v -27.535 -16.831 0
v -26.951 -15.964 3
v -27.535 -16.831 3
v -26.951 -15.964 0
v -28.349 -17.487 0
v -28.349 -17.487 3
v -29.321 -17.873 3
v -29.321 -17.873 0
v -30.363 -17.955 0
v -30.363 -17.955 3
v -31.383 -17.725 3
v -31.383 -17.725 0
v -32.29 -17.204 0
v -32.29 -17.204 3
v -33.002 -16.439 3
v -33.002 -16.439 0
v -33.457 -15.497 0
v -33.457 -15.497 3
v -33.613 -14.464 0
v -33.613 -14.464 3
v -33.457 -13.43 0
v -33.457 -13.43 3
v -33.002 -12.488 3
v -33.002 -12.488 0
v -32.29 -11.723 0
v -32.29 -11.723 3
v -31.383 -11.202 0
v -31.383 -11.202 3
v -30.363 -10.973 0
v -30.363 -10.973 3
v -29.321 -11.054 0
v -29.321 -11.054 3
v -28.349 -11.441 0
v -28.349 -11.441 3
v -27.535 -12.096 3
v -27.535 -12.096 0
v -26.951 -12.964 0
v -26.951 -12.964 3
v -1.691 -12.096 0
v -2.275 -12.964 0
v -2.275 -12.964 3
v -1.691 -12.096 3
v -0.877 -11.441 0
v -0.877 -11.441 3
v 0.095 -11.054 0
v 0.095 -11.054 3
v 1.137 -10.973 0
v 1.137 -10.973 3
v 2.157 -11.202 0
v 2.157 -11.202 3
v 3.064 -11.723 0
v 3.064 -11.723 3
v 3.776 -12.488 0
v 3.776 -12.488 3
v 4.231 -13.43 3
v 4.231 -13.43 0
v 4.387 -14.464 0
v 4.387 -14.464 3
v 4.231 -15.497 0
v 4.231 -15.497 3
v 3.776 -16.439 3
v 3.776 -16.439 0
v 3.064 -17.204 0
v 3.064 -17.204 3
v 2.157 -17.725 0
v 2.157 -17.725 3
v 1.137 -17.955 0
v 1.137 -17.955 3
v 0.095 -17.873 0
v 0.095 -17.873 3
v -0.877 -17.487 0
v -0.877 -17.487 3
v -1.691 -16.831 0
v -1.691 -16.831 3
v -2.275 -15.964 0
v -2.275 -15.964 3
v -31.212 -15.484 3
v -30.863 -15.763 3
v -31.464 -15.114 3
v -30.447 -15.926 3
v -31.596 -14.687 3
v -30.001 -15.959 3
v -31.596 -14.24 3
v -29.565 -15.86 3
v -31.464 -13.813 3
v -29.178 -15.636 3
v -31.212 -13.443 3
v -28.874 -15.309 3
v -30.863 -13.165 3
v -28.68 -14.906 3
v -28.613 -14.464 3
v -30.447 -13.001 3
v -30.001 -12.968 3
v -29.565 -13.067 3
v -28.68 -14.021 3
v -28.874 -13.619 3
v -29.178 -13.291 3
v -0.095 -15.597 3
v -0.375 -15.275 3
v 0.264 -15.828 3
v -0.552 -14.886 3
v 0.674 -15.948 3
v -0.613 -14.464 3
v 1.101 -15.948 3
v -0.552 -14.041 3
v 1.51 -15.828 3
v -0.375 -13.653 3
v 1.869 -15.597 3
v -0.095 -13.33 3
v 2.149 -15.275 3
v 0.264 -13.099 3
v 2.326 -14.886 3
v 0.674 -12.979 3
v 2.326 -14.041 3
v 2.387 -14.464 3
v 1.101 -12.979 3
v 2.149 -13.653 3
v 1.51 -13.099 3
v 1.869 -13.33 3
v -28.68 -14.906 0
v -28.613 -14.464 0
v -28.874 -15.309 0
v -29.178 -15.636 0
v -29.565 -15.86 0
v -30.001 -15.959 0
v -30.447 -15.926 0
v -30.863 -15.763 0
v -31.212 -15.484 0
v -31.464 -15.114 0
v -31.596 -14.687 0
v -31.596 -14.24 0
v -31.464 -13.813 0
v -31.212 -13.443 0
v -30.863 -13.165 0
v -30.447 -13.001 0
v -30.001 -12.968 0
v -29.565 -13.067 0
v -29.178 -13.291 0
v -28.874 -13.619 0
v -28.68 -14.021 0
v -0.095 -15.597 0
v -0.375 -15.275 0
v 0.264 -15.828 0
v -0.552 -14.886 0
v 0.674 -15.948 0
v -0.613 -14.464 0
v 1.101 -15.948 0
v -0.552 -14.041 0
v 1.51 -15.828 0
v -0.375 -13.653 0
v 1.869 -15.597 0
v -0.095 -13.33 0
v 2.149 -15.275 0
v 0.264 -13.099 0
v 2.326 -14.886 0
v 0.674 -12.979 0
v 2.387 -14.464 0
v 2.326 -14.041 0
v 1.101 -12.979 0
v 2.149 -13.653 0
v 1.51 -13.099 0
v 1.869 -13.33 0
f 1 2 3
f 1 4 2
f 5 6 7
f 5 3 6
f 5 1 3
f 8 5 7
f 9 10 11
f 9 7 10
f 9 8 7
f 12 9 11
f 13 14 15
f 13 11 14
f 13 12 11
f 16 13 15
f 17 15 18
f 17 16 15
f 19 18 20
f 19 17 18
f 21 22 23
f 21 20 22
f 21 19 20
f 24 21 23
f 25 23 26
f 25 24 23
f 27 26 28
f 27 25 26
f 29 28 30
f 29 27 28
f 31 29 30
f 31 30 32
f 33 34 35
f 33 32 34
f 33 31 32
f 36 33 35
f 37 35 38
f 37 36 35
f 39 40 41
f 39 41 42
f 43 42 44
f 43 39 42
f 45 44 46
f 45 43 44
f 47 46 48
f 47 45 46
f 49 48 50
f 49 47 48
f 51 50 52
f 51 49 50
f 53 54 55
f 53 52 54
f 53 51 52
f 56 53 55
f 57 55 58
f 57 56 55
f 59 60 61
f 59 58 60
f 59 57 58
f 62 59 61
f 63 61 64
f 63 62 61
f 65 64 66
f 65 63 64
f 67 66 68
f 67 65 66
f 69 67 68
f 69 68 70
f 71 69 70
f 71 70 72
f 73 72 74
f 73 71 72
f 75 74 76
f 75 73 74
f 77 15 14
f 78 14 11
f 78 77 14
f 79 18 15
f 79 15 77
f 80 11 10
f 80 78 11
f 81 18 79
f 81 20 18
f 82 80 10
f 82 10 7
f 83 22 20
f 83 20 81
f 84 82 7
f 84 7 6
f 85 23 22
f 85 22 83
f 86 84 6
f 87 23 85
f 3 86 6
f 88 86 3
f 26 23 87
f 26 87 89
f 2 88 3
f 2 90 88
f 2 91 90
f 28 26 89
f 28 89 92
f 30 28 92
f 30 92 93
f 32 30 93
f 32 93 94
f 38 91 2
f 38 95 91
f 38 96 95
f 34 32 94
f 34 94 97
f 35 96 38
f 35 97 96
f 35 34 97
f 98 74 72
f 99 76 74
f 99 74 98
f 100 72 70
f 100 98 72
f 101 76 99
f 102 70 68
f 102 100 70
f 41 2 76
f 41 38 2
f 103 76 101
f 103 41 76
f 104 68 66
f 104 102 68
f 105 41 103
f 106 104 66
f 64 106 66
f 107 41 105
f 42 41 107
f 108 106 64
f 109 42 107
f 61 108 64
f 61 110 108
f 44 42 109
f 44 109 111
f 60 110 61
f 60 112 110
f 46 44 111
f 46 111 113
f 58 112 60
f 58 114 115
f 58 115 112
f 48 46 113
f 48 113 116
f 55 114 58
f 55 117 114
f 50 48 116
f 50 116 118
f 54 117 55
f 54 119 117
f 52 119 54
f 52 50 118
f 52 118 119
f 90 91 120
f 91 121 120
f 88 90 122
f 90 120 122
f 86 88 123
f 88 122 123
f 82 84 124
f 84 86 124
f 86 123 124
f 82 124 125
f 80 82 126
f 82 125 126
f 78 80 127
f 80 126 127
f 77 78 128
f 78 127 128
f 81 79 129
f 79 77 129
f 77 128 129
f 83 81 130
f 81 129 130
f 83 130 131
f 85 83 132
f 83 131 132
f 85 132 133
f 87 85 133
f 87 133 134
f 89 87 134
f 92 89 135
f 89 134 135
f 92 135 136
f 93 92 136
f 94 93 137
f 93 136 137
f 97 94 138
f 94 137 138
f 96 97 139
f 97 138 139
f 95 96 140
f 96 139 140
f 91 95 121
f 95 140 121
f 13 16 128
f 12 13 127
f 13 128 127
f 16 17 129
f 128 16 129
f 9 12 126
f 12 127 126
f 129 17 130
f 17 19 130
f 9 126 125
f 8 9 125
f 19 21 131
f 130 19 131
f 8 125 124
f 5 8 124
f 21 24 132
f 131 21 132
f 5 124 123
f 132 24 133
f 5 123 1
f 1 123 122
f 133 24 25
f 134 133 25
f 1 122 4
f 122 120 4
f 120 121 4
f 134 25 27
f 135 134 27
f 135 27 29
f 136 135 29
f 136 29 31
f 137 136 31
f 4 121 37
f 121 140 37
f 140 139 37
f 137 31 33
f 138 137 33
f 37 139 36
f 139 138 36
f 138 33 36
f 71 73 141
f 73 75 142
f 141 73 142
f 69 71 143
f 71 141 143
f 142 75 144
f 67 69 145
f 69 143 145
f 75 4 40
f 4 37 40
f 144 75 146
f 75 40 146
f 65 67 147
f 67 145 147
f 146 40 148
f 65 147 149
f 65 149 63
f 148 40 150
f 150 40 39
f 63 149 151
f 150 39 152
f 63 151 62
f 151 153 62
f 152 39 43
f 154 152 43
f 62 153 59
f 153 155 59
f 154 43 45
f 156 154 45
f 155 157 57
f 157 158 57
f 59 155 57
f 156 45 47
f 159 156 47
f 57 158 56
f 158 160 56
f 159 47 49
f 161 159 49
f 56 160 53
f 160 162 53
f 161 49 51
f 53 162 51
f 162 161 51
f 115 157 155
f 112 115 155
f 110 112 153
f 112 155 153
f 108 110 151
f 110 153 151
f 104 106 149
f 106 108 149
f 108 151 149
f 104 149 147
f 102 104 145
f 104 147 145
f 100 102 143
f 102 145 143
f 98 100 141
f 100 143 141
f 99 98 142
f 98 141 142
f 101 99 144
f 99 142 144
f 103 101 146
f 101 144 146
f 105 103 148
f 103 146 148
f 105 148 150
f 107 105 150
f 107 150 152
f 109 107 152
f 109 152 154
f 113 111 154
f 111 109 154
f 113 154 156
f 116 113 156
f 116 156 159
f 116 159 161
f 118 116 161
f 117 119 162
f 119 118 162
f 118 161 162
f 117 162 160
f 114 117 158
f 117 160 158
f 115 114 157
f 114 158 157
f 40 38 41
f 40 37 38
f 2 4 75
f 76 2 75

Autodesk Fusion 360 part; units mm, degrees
sketch "Sketch1" plane through (0, 0, 0) normal (0, 0, 1) x (1, 0, 0)
  circle A0 centre (-30.1129, -14.4636) radius 3.5
  circle A1 centre (-30.1129, -14.4636) radius 1.5
  line L0 (-30.1129, -14.4636) -> (0.8871, -14.4636)
  line L1 (-14.6129, -4.9636) -> (-14.6129, -23.9636) construction
  circle A2 centre (0.8871, -14.4636) radius 3.5
  circle A3 centre (0.8871, -14.4636) radius 1.5
  line L2 (-26.9506, -12.9636) -> (-2.2752, -12.9636)
  line L3 (-26.9506, -15.9636) -> (-2.2752, -15.9636)
  point P0 (0.8871, -14.4636)
  dimension "d1" = 7
  dimension "d2" = 3
  dimension "d3" = 31
  dimension "d4" = 1.5
extrude "Extrude1" add sketch "Sketch1" along normal blind 3
